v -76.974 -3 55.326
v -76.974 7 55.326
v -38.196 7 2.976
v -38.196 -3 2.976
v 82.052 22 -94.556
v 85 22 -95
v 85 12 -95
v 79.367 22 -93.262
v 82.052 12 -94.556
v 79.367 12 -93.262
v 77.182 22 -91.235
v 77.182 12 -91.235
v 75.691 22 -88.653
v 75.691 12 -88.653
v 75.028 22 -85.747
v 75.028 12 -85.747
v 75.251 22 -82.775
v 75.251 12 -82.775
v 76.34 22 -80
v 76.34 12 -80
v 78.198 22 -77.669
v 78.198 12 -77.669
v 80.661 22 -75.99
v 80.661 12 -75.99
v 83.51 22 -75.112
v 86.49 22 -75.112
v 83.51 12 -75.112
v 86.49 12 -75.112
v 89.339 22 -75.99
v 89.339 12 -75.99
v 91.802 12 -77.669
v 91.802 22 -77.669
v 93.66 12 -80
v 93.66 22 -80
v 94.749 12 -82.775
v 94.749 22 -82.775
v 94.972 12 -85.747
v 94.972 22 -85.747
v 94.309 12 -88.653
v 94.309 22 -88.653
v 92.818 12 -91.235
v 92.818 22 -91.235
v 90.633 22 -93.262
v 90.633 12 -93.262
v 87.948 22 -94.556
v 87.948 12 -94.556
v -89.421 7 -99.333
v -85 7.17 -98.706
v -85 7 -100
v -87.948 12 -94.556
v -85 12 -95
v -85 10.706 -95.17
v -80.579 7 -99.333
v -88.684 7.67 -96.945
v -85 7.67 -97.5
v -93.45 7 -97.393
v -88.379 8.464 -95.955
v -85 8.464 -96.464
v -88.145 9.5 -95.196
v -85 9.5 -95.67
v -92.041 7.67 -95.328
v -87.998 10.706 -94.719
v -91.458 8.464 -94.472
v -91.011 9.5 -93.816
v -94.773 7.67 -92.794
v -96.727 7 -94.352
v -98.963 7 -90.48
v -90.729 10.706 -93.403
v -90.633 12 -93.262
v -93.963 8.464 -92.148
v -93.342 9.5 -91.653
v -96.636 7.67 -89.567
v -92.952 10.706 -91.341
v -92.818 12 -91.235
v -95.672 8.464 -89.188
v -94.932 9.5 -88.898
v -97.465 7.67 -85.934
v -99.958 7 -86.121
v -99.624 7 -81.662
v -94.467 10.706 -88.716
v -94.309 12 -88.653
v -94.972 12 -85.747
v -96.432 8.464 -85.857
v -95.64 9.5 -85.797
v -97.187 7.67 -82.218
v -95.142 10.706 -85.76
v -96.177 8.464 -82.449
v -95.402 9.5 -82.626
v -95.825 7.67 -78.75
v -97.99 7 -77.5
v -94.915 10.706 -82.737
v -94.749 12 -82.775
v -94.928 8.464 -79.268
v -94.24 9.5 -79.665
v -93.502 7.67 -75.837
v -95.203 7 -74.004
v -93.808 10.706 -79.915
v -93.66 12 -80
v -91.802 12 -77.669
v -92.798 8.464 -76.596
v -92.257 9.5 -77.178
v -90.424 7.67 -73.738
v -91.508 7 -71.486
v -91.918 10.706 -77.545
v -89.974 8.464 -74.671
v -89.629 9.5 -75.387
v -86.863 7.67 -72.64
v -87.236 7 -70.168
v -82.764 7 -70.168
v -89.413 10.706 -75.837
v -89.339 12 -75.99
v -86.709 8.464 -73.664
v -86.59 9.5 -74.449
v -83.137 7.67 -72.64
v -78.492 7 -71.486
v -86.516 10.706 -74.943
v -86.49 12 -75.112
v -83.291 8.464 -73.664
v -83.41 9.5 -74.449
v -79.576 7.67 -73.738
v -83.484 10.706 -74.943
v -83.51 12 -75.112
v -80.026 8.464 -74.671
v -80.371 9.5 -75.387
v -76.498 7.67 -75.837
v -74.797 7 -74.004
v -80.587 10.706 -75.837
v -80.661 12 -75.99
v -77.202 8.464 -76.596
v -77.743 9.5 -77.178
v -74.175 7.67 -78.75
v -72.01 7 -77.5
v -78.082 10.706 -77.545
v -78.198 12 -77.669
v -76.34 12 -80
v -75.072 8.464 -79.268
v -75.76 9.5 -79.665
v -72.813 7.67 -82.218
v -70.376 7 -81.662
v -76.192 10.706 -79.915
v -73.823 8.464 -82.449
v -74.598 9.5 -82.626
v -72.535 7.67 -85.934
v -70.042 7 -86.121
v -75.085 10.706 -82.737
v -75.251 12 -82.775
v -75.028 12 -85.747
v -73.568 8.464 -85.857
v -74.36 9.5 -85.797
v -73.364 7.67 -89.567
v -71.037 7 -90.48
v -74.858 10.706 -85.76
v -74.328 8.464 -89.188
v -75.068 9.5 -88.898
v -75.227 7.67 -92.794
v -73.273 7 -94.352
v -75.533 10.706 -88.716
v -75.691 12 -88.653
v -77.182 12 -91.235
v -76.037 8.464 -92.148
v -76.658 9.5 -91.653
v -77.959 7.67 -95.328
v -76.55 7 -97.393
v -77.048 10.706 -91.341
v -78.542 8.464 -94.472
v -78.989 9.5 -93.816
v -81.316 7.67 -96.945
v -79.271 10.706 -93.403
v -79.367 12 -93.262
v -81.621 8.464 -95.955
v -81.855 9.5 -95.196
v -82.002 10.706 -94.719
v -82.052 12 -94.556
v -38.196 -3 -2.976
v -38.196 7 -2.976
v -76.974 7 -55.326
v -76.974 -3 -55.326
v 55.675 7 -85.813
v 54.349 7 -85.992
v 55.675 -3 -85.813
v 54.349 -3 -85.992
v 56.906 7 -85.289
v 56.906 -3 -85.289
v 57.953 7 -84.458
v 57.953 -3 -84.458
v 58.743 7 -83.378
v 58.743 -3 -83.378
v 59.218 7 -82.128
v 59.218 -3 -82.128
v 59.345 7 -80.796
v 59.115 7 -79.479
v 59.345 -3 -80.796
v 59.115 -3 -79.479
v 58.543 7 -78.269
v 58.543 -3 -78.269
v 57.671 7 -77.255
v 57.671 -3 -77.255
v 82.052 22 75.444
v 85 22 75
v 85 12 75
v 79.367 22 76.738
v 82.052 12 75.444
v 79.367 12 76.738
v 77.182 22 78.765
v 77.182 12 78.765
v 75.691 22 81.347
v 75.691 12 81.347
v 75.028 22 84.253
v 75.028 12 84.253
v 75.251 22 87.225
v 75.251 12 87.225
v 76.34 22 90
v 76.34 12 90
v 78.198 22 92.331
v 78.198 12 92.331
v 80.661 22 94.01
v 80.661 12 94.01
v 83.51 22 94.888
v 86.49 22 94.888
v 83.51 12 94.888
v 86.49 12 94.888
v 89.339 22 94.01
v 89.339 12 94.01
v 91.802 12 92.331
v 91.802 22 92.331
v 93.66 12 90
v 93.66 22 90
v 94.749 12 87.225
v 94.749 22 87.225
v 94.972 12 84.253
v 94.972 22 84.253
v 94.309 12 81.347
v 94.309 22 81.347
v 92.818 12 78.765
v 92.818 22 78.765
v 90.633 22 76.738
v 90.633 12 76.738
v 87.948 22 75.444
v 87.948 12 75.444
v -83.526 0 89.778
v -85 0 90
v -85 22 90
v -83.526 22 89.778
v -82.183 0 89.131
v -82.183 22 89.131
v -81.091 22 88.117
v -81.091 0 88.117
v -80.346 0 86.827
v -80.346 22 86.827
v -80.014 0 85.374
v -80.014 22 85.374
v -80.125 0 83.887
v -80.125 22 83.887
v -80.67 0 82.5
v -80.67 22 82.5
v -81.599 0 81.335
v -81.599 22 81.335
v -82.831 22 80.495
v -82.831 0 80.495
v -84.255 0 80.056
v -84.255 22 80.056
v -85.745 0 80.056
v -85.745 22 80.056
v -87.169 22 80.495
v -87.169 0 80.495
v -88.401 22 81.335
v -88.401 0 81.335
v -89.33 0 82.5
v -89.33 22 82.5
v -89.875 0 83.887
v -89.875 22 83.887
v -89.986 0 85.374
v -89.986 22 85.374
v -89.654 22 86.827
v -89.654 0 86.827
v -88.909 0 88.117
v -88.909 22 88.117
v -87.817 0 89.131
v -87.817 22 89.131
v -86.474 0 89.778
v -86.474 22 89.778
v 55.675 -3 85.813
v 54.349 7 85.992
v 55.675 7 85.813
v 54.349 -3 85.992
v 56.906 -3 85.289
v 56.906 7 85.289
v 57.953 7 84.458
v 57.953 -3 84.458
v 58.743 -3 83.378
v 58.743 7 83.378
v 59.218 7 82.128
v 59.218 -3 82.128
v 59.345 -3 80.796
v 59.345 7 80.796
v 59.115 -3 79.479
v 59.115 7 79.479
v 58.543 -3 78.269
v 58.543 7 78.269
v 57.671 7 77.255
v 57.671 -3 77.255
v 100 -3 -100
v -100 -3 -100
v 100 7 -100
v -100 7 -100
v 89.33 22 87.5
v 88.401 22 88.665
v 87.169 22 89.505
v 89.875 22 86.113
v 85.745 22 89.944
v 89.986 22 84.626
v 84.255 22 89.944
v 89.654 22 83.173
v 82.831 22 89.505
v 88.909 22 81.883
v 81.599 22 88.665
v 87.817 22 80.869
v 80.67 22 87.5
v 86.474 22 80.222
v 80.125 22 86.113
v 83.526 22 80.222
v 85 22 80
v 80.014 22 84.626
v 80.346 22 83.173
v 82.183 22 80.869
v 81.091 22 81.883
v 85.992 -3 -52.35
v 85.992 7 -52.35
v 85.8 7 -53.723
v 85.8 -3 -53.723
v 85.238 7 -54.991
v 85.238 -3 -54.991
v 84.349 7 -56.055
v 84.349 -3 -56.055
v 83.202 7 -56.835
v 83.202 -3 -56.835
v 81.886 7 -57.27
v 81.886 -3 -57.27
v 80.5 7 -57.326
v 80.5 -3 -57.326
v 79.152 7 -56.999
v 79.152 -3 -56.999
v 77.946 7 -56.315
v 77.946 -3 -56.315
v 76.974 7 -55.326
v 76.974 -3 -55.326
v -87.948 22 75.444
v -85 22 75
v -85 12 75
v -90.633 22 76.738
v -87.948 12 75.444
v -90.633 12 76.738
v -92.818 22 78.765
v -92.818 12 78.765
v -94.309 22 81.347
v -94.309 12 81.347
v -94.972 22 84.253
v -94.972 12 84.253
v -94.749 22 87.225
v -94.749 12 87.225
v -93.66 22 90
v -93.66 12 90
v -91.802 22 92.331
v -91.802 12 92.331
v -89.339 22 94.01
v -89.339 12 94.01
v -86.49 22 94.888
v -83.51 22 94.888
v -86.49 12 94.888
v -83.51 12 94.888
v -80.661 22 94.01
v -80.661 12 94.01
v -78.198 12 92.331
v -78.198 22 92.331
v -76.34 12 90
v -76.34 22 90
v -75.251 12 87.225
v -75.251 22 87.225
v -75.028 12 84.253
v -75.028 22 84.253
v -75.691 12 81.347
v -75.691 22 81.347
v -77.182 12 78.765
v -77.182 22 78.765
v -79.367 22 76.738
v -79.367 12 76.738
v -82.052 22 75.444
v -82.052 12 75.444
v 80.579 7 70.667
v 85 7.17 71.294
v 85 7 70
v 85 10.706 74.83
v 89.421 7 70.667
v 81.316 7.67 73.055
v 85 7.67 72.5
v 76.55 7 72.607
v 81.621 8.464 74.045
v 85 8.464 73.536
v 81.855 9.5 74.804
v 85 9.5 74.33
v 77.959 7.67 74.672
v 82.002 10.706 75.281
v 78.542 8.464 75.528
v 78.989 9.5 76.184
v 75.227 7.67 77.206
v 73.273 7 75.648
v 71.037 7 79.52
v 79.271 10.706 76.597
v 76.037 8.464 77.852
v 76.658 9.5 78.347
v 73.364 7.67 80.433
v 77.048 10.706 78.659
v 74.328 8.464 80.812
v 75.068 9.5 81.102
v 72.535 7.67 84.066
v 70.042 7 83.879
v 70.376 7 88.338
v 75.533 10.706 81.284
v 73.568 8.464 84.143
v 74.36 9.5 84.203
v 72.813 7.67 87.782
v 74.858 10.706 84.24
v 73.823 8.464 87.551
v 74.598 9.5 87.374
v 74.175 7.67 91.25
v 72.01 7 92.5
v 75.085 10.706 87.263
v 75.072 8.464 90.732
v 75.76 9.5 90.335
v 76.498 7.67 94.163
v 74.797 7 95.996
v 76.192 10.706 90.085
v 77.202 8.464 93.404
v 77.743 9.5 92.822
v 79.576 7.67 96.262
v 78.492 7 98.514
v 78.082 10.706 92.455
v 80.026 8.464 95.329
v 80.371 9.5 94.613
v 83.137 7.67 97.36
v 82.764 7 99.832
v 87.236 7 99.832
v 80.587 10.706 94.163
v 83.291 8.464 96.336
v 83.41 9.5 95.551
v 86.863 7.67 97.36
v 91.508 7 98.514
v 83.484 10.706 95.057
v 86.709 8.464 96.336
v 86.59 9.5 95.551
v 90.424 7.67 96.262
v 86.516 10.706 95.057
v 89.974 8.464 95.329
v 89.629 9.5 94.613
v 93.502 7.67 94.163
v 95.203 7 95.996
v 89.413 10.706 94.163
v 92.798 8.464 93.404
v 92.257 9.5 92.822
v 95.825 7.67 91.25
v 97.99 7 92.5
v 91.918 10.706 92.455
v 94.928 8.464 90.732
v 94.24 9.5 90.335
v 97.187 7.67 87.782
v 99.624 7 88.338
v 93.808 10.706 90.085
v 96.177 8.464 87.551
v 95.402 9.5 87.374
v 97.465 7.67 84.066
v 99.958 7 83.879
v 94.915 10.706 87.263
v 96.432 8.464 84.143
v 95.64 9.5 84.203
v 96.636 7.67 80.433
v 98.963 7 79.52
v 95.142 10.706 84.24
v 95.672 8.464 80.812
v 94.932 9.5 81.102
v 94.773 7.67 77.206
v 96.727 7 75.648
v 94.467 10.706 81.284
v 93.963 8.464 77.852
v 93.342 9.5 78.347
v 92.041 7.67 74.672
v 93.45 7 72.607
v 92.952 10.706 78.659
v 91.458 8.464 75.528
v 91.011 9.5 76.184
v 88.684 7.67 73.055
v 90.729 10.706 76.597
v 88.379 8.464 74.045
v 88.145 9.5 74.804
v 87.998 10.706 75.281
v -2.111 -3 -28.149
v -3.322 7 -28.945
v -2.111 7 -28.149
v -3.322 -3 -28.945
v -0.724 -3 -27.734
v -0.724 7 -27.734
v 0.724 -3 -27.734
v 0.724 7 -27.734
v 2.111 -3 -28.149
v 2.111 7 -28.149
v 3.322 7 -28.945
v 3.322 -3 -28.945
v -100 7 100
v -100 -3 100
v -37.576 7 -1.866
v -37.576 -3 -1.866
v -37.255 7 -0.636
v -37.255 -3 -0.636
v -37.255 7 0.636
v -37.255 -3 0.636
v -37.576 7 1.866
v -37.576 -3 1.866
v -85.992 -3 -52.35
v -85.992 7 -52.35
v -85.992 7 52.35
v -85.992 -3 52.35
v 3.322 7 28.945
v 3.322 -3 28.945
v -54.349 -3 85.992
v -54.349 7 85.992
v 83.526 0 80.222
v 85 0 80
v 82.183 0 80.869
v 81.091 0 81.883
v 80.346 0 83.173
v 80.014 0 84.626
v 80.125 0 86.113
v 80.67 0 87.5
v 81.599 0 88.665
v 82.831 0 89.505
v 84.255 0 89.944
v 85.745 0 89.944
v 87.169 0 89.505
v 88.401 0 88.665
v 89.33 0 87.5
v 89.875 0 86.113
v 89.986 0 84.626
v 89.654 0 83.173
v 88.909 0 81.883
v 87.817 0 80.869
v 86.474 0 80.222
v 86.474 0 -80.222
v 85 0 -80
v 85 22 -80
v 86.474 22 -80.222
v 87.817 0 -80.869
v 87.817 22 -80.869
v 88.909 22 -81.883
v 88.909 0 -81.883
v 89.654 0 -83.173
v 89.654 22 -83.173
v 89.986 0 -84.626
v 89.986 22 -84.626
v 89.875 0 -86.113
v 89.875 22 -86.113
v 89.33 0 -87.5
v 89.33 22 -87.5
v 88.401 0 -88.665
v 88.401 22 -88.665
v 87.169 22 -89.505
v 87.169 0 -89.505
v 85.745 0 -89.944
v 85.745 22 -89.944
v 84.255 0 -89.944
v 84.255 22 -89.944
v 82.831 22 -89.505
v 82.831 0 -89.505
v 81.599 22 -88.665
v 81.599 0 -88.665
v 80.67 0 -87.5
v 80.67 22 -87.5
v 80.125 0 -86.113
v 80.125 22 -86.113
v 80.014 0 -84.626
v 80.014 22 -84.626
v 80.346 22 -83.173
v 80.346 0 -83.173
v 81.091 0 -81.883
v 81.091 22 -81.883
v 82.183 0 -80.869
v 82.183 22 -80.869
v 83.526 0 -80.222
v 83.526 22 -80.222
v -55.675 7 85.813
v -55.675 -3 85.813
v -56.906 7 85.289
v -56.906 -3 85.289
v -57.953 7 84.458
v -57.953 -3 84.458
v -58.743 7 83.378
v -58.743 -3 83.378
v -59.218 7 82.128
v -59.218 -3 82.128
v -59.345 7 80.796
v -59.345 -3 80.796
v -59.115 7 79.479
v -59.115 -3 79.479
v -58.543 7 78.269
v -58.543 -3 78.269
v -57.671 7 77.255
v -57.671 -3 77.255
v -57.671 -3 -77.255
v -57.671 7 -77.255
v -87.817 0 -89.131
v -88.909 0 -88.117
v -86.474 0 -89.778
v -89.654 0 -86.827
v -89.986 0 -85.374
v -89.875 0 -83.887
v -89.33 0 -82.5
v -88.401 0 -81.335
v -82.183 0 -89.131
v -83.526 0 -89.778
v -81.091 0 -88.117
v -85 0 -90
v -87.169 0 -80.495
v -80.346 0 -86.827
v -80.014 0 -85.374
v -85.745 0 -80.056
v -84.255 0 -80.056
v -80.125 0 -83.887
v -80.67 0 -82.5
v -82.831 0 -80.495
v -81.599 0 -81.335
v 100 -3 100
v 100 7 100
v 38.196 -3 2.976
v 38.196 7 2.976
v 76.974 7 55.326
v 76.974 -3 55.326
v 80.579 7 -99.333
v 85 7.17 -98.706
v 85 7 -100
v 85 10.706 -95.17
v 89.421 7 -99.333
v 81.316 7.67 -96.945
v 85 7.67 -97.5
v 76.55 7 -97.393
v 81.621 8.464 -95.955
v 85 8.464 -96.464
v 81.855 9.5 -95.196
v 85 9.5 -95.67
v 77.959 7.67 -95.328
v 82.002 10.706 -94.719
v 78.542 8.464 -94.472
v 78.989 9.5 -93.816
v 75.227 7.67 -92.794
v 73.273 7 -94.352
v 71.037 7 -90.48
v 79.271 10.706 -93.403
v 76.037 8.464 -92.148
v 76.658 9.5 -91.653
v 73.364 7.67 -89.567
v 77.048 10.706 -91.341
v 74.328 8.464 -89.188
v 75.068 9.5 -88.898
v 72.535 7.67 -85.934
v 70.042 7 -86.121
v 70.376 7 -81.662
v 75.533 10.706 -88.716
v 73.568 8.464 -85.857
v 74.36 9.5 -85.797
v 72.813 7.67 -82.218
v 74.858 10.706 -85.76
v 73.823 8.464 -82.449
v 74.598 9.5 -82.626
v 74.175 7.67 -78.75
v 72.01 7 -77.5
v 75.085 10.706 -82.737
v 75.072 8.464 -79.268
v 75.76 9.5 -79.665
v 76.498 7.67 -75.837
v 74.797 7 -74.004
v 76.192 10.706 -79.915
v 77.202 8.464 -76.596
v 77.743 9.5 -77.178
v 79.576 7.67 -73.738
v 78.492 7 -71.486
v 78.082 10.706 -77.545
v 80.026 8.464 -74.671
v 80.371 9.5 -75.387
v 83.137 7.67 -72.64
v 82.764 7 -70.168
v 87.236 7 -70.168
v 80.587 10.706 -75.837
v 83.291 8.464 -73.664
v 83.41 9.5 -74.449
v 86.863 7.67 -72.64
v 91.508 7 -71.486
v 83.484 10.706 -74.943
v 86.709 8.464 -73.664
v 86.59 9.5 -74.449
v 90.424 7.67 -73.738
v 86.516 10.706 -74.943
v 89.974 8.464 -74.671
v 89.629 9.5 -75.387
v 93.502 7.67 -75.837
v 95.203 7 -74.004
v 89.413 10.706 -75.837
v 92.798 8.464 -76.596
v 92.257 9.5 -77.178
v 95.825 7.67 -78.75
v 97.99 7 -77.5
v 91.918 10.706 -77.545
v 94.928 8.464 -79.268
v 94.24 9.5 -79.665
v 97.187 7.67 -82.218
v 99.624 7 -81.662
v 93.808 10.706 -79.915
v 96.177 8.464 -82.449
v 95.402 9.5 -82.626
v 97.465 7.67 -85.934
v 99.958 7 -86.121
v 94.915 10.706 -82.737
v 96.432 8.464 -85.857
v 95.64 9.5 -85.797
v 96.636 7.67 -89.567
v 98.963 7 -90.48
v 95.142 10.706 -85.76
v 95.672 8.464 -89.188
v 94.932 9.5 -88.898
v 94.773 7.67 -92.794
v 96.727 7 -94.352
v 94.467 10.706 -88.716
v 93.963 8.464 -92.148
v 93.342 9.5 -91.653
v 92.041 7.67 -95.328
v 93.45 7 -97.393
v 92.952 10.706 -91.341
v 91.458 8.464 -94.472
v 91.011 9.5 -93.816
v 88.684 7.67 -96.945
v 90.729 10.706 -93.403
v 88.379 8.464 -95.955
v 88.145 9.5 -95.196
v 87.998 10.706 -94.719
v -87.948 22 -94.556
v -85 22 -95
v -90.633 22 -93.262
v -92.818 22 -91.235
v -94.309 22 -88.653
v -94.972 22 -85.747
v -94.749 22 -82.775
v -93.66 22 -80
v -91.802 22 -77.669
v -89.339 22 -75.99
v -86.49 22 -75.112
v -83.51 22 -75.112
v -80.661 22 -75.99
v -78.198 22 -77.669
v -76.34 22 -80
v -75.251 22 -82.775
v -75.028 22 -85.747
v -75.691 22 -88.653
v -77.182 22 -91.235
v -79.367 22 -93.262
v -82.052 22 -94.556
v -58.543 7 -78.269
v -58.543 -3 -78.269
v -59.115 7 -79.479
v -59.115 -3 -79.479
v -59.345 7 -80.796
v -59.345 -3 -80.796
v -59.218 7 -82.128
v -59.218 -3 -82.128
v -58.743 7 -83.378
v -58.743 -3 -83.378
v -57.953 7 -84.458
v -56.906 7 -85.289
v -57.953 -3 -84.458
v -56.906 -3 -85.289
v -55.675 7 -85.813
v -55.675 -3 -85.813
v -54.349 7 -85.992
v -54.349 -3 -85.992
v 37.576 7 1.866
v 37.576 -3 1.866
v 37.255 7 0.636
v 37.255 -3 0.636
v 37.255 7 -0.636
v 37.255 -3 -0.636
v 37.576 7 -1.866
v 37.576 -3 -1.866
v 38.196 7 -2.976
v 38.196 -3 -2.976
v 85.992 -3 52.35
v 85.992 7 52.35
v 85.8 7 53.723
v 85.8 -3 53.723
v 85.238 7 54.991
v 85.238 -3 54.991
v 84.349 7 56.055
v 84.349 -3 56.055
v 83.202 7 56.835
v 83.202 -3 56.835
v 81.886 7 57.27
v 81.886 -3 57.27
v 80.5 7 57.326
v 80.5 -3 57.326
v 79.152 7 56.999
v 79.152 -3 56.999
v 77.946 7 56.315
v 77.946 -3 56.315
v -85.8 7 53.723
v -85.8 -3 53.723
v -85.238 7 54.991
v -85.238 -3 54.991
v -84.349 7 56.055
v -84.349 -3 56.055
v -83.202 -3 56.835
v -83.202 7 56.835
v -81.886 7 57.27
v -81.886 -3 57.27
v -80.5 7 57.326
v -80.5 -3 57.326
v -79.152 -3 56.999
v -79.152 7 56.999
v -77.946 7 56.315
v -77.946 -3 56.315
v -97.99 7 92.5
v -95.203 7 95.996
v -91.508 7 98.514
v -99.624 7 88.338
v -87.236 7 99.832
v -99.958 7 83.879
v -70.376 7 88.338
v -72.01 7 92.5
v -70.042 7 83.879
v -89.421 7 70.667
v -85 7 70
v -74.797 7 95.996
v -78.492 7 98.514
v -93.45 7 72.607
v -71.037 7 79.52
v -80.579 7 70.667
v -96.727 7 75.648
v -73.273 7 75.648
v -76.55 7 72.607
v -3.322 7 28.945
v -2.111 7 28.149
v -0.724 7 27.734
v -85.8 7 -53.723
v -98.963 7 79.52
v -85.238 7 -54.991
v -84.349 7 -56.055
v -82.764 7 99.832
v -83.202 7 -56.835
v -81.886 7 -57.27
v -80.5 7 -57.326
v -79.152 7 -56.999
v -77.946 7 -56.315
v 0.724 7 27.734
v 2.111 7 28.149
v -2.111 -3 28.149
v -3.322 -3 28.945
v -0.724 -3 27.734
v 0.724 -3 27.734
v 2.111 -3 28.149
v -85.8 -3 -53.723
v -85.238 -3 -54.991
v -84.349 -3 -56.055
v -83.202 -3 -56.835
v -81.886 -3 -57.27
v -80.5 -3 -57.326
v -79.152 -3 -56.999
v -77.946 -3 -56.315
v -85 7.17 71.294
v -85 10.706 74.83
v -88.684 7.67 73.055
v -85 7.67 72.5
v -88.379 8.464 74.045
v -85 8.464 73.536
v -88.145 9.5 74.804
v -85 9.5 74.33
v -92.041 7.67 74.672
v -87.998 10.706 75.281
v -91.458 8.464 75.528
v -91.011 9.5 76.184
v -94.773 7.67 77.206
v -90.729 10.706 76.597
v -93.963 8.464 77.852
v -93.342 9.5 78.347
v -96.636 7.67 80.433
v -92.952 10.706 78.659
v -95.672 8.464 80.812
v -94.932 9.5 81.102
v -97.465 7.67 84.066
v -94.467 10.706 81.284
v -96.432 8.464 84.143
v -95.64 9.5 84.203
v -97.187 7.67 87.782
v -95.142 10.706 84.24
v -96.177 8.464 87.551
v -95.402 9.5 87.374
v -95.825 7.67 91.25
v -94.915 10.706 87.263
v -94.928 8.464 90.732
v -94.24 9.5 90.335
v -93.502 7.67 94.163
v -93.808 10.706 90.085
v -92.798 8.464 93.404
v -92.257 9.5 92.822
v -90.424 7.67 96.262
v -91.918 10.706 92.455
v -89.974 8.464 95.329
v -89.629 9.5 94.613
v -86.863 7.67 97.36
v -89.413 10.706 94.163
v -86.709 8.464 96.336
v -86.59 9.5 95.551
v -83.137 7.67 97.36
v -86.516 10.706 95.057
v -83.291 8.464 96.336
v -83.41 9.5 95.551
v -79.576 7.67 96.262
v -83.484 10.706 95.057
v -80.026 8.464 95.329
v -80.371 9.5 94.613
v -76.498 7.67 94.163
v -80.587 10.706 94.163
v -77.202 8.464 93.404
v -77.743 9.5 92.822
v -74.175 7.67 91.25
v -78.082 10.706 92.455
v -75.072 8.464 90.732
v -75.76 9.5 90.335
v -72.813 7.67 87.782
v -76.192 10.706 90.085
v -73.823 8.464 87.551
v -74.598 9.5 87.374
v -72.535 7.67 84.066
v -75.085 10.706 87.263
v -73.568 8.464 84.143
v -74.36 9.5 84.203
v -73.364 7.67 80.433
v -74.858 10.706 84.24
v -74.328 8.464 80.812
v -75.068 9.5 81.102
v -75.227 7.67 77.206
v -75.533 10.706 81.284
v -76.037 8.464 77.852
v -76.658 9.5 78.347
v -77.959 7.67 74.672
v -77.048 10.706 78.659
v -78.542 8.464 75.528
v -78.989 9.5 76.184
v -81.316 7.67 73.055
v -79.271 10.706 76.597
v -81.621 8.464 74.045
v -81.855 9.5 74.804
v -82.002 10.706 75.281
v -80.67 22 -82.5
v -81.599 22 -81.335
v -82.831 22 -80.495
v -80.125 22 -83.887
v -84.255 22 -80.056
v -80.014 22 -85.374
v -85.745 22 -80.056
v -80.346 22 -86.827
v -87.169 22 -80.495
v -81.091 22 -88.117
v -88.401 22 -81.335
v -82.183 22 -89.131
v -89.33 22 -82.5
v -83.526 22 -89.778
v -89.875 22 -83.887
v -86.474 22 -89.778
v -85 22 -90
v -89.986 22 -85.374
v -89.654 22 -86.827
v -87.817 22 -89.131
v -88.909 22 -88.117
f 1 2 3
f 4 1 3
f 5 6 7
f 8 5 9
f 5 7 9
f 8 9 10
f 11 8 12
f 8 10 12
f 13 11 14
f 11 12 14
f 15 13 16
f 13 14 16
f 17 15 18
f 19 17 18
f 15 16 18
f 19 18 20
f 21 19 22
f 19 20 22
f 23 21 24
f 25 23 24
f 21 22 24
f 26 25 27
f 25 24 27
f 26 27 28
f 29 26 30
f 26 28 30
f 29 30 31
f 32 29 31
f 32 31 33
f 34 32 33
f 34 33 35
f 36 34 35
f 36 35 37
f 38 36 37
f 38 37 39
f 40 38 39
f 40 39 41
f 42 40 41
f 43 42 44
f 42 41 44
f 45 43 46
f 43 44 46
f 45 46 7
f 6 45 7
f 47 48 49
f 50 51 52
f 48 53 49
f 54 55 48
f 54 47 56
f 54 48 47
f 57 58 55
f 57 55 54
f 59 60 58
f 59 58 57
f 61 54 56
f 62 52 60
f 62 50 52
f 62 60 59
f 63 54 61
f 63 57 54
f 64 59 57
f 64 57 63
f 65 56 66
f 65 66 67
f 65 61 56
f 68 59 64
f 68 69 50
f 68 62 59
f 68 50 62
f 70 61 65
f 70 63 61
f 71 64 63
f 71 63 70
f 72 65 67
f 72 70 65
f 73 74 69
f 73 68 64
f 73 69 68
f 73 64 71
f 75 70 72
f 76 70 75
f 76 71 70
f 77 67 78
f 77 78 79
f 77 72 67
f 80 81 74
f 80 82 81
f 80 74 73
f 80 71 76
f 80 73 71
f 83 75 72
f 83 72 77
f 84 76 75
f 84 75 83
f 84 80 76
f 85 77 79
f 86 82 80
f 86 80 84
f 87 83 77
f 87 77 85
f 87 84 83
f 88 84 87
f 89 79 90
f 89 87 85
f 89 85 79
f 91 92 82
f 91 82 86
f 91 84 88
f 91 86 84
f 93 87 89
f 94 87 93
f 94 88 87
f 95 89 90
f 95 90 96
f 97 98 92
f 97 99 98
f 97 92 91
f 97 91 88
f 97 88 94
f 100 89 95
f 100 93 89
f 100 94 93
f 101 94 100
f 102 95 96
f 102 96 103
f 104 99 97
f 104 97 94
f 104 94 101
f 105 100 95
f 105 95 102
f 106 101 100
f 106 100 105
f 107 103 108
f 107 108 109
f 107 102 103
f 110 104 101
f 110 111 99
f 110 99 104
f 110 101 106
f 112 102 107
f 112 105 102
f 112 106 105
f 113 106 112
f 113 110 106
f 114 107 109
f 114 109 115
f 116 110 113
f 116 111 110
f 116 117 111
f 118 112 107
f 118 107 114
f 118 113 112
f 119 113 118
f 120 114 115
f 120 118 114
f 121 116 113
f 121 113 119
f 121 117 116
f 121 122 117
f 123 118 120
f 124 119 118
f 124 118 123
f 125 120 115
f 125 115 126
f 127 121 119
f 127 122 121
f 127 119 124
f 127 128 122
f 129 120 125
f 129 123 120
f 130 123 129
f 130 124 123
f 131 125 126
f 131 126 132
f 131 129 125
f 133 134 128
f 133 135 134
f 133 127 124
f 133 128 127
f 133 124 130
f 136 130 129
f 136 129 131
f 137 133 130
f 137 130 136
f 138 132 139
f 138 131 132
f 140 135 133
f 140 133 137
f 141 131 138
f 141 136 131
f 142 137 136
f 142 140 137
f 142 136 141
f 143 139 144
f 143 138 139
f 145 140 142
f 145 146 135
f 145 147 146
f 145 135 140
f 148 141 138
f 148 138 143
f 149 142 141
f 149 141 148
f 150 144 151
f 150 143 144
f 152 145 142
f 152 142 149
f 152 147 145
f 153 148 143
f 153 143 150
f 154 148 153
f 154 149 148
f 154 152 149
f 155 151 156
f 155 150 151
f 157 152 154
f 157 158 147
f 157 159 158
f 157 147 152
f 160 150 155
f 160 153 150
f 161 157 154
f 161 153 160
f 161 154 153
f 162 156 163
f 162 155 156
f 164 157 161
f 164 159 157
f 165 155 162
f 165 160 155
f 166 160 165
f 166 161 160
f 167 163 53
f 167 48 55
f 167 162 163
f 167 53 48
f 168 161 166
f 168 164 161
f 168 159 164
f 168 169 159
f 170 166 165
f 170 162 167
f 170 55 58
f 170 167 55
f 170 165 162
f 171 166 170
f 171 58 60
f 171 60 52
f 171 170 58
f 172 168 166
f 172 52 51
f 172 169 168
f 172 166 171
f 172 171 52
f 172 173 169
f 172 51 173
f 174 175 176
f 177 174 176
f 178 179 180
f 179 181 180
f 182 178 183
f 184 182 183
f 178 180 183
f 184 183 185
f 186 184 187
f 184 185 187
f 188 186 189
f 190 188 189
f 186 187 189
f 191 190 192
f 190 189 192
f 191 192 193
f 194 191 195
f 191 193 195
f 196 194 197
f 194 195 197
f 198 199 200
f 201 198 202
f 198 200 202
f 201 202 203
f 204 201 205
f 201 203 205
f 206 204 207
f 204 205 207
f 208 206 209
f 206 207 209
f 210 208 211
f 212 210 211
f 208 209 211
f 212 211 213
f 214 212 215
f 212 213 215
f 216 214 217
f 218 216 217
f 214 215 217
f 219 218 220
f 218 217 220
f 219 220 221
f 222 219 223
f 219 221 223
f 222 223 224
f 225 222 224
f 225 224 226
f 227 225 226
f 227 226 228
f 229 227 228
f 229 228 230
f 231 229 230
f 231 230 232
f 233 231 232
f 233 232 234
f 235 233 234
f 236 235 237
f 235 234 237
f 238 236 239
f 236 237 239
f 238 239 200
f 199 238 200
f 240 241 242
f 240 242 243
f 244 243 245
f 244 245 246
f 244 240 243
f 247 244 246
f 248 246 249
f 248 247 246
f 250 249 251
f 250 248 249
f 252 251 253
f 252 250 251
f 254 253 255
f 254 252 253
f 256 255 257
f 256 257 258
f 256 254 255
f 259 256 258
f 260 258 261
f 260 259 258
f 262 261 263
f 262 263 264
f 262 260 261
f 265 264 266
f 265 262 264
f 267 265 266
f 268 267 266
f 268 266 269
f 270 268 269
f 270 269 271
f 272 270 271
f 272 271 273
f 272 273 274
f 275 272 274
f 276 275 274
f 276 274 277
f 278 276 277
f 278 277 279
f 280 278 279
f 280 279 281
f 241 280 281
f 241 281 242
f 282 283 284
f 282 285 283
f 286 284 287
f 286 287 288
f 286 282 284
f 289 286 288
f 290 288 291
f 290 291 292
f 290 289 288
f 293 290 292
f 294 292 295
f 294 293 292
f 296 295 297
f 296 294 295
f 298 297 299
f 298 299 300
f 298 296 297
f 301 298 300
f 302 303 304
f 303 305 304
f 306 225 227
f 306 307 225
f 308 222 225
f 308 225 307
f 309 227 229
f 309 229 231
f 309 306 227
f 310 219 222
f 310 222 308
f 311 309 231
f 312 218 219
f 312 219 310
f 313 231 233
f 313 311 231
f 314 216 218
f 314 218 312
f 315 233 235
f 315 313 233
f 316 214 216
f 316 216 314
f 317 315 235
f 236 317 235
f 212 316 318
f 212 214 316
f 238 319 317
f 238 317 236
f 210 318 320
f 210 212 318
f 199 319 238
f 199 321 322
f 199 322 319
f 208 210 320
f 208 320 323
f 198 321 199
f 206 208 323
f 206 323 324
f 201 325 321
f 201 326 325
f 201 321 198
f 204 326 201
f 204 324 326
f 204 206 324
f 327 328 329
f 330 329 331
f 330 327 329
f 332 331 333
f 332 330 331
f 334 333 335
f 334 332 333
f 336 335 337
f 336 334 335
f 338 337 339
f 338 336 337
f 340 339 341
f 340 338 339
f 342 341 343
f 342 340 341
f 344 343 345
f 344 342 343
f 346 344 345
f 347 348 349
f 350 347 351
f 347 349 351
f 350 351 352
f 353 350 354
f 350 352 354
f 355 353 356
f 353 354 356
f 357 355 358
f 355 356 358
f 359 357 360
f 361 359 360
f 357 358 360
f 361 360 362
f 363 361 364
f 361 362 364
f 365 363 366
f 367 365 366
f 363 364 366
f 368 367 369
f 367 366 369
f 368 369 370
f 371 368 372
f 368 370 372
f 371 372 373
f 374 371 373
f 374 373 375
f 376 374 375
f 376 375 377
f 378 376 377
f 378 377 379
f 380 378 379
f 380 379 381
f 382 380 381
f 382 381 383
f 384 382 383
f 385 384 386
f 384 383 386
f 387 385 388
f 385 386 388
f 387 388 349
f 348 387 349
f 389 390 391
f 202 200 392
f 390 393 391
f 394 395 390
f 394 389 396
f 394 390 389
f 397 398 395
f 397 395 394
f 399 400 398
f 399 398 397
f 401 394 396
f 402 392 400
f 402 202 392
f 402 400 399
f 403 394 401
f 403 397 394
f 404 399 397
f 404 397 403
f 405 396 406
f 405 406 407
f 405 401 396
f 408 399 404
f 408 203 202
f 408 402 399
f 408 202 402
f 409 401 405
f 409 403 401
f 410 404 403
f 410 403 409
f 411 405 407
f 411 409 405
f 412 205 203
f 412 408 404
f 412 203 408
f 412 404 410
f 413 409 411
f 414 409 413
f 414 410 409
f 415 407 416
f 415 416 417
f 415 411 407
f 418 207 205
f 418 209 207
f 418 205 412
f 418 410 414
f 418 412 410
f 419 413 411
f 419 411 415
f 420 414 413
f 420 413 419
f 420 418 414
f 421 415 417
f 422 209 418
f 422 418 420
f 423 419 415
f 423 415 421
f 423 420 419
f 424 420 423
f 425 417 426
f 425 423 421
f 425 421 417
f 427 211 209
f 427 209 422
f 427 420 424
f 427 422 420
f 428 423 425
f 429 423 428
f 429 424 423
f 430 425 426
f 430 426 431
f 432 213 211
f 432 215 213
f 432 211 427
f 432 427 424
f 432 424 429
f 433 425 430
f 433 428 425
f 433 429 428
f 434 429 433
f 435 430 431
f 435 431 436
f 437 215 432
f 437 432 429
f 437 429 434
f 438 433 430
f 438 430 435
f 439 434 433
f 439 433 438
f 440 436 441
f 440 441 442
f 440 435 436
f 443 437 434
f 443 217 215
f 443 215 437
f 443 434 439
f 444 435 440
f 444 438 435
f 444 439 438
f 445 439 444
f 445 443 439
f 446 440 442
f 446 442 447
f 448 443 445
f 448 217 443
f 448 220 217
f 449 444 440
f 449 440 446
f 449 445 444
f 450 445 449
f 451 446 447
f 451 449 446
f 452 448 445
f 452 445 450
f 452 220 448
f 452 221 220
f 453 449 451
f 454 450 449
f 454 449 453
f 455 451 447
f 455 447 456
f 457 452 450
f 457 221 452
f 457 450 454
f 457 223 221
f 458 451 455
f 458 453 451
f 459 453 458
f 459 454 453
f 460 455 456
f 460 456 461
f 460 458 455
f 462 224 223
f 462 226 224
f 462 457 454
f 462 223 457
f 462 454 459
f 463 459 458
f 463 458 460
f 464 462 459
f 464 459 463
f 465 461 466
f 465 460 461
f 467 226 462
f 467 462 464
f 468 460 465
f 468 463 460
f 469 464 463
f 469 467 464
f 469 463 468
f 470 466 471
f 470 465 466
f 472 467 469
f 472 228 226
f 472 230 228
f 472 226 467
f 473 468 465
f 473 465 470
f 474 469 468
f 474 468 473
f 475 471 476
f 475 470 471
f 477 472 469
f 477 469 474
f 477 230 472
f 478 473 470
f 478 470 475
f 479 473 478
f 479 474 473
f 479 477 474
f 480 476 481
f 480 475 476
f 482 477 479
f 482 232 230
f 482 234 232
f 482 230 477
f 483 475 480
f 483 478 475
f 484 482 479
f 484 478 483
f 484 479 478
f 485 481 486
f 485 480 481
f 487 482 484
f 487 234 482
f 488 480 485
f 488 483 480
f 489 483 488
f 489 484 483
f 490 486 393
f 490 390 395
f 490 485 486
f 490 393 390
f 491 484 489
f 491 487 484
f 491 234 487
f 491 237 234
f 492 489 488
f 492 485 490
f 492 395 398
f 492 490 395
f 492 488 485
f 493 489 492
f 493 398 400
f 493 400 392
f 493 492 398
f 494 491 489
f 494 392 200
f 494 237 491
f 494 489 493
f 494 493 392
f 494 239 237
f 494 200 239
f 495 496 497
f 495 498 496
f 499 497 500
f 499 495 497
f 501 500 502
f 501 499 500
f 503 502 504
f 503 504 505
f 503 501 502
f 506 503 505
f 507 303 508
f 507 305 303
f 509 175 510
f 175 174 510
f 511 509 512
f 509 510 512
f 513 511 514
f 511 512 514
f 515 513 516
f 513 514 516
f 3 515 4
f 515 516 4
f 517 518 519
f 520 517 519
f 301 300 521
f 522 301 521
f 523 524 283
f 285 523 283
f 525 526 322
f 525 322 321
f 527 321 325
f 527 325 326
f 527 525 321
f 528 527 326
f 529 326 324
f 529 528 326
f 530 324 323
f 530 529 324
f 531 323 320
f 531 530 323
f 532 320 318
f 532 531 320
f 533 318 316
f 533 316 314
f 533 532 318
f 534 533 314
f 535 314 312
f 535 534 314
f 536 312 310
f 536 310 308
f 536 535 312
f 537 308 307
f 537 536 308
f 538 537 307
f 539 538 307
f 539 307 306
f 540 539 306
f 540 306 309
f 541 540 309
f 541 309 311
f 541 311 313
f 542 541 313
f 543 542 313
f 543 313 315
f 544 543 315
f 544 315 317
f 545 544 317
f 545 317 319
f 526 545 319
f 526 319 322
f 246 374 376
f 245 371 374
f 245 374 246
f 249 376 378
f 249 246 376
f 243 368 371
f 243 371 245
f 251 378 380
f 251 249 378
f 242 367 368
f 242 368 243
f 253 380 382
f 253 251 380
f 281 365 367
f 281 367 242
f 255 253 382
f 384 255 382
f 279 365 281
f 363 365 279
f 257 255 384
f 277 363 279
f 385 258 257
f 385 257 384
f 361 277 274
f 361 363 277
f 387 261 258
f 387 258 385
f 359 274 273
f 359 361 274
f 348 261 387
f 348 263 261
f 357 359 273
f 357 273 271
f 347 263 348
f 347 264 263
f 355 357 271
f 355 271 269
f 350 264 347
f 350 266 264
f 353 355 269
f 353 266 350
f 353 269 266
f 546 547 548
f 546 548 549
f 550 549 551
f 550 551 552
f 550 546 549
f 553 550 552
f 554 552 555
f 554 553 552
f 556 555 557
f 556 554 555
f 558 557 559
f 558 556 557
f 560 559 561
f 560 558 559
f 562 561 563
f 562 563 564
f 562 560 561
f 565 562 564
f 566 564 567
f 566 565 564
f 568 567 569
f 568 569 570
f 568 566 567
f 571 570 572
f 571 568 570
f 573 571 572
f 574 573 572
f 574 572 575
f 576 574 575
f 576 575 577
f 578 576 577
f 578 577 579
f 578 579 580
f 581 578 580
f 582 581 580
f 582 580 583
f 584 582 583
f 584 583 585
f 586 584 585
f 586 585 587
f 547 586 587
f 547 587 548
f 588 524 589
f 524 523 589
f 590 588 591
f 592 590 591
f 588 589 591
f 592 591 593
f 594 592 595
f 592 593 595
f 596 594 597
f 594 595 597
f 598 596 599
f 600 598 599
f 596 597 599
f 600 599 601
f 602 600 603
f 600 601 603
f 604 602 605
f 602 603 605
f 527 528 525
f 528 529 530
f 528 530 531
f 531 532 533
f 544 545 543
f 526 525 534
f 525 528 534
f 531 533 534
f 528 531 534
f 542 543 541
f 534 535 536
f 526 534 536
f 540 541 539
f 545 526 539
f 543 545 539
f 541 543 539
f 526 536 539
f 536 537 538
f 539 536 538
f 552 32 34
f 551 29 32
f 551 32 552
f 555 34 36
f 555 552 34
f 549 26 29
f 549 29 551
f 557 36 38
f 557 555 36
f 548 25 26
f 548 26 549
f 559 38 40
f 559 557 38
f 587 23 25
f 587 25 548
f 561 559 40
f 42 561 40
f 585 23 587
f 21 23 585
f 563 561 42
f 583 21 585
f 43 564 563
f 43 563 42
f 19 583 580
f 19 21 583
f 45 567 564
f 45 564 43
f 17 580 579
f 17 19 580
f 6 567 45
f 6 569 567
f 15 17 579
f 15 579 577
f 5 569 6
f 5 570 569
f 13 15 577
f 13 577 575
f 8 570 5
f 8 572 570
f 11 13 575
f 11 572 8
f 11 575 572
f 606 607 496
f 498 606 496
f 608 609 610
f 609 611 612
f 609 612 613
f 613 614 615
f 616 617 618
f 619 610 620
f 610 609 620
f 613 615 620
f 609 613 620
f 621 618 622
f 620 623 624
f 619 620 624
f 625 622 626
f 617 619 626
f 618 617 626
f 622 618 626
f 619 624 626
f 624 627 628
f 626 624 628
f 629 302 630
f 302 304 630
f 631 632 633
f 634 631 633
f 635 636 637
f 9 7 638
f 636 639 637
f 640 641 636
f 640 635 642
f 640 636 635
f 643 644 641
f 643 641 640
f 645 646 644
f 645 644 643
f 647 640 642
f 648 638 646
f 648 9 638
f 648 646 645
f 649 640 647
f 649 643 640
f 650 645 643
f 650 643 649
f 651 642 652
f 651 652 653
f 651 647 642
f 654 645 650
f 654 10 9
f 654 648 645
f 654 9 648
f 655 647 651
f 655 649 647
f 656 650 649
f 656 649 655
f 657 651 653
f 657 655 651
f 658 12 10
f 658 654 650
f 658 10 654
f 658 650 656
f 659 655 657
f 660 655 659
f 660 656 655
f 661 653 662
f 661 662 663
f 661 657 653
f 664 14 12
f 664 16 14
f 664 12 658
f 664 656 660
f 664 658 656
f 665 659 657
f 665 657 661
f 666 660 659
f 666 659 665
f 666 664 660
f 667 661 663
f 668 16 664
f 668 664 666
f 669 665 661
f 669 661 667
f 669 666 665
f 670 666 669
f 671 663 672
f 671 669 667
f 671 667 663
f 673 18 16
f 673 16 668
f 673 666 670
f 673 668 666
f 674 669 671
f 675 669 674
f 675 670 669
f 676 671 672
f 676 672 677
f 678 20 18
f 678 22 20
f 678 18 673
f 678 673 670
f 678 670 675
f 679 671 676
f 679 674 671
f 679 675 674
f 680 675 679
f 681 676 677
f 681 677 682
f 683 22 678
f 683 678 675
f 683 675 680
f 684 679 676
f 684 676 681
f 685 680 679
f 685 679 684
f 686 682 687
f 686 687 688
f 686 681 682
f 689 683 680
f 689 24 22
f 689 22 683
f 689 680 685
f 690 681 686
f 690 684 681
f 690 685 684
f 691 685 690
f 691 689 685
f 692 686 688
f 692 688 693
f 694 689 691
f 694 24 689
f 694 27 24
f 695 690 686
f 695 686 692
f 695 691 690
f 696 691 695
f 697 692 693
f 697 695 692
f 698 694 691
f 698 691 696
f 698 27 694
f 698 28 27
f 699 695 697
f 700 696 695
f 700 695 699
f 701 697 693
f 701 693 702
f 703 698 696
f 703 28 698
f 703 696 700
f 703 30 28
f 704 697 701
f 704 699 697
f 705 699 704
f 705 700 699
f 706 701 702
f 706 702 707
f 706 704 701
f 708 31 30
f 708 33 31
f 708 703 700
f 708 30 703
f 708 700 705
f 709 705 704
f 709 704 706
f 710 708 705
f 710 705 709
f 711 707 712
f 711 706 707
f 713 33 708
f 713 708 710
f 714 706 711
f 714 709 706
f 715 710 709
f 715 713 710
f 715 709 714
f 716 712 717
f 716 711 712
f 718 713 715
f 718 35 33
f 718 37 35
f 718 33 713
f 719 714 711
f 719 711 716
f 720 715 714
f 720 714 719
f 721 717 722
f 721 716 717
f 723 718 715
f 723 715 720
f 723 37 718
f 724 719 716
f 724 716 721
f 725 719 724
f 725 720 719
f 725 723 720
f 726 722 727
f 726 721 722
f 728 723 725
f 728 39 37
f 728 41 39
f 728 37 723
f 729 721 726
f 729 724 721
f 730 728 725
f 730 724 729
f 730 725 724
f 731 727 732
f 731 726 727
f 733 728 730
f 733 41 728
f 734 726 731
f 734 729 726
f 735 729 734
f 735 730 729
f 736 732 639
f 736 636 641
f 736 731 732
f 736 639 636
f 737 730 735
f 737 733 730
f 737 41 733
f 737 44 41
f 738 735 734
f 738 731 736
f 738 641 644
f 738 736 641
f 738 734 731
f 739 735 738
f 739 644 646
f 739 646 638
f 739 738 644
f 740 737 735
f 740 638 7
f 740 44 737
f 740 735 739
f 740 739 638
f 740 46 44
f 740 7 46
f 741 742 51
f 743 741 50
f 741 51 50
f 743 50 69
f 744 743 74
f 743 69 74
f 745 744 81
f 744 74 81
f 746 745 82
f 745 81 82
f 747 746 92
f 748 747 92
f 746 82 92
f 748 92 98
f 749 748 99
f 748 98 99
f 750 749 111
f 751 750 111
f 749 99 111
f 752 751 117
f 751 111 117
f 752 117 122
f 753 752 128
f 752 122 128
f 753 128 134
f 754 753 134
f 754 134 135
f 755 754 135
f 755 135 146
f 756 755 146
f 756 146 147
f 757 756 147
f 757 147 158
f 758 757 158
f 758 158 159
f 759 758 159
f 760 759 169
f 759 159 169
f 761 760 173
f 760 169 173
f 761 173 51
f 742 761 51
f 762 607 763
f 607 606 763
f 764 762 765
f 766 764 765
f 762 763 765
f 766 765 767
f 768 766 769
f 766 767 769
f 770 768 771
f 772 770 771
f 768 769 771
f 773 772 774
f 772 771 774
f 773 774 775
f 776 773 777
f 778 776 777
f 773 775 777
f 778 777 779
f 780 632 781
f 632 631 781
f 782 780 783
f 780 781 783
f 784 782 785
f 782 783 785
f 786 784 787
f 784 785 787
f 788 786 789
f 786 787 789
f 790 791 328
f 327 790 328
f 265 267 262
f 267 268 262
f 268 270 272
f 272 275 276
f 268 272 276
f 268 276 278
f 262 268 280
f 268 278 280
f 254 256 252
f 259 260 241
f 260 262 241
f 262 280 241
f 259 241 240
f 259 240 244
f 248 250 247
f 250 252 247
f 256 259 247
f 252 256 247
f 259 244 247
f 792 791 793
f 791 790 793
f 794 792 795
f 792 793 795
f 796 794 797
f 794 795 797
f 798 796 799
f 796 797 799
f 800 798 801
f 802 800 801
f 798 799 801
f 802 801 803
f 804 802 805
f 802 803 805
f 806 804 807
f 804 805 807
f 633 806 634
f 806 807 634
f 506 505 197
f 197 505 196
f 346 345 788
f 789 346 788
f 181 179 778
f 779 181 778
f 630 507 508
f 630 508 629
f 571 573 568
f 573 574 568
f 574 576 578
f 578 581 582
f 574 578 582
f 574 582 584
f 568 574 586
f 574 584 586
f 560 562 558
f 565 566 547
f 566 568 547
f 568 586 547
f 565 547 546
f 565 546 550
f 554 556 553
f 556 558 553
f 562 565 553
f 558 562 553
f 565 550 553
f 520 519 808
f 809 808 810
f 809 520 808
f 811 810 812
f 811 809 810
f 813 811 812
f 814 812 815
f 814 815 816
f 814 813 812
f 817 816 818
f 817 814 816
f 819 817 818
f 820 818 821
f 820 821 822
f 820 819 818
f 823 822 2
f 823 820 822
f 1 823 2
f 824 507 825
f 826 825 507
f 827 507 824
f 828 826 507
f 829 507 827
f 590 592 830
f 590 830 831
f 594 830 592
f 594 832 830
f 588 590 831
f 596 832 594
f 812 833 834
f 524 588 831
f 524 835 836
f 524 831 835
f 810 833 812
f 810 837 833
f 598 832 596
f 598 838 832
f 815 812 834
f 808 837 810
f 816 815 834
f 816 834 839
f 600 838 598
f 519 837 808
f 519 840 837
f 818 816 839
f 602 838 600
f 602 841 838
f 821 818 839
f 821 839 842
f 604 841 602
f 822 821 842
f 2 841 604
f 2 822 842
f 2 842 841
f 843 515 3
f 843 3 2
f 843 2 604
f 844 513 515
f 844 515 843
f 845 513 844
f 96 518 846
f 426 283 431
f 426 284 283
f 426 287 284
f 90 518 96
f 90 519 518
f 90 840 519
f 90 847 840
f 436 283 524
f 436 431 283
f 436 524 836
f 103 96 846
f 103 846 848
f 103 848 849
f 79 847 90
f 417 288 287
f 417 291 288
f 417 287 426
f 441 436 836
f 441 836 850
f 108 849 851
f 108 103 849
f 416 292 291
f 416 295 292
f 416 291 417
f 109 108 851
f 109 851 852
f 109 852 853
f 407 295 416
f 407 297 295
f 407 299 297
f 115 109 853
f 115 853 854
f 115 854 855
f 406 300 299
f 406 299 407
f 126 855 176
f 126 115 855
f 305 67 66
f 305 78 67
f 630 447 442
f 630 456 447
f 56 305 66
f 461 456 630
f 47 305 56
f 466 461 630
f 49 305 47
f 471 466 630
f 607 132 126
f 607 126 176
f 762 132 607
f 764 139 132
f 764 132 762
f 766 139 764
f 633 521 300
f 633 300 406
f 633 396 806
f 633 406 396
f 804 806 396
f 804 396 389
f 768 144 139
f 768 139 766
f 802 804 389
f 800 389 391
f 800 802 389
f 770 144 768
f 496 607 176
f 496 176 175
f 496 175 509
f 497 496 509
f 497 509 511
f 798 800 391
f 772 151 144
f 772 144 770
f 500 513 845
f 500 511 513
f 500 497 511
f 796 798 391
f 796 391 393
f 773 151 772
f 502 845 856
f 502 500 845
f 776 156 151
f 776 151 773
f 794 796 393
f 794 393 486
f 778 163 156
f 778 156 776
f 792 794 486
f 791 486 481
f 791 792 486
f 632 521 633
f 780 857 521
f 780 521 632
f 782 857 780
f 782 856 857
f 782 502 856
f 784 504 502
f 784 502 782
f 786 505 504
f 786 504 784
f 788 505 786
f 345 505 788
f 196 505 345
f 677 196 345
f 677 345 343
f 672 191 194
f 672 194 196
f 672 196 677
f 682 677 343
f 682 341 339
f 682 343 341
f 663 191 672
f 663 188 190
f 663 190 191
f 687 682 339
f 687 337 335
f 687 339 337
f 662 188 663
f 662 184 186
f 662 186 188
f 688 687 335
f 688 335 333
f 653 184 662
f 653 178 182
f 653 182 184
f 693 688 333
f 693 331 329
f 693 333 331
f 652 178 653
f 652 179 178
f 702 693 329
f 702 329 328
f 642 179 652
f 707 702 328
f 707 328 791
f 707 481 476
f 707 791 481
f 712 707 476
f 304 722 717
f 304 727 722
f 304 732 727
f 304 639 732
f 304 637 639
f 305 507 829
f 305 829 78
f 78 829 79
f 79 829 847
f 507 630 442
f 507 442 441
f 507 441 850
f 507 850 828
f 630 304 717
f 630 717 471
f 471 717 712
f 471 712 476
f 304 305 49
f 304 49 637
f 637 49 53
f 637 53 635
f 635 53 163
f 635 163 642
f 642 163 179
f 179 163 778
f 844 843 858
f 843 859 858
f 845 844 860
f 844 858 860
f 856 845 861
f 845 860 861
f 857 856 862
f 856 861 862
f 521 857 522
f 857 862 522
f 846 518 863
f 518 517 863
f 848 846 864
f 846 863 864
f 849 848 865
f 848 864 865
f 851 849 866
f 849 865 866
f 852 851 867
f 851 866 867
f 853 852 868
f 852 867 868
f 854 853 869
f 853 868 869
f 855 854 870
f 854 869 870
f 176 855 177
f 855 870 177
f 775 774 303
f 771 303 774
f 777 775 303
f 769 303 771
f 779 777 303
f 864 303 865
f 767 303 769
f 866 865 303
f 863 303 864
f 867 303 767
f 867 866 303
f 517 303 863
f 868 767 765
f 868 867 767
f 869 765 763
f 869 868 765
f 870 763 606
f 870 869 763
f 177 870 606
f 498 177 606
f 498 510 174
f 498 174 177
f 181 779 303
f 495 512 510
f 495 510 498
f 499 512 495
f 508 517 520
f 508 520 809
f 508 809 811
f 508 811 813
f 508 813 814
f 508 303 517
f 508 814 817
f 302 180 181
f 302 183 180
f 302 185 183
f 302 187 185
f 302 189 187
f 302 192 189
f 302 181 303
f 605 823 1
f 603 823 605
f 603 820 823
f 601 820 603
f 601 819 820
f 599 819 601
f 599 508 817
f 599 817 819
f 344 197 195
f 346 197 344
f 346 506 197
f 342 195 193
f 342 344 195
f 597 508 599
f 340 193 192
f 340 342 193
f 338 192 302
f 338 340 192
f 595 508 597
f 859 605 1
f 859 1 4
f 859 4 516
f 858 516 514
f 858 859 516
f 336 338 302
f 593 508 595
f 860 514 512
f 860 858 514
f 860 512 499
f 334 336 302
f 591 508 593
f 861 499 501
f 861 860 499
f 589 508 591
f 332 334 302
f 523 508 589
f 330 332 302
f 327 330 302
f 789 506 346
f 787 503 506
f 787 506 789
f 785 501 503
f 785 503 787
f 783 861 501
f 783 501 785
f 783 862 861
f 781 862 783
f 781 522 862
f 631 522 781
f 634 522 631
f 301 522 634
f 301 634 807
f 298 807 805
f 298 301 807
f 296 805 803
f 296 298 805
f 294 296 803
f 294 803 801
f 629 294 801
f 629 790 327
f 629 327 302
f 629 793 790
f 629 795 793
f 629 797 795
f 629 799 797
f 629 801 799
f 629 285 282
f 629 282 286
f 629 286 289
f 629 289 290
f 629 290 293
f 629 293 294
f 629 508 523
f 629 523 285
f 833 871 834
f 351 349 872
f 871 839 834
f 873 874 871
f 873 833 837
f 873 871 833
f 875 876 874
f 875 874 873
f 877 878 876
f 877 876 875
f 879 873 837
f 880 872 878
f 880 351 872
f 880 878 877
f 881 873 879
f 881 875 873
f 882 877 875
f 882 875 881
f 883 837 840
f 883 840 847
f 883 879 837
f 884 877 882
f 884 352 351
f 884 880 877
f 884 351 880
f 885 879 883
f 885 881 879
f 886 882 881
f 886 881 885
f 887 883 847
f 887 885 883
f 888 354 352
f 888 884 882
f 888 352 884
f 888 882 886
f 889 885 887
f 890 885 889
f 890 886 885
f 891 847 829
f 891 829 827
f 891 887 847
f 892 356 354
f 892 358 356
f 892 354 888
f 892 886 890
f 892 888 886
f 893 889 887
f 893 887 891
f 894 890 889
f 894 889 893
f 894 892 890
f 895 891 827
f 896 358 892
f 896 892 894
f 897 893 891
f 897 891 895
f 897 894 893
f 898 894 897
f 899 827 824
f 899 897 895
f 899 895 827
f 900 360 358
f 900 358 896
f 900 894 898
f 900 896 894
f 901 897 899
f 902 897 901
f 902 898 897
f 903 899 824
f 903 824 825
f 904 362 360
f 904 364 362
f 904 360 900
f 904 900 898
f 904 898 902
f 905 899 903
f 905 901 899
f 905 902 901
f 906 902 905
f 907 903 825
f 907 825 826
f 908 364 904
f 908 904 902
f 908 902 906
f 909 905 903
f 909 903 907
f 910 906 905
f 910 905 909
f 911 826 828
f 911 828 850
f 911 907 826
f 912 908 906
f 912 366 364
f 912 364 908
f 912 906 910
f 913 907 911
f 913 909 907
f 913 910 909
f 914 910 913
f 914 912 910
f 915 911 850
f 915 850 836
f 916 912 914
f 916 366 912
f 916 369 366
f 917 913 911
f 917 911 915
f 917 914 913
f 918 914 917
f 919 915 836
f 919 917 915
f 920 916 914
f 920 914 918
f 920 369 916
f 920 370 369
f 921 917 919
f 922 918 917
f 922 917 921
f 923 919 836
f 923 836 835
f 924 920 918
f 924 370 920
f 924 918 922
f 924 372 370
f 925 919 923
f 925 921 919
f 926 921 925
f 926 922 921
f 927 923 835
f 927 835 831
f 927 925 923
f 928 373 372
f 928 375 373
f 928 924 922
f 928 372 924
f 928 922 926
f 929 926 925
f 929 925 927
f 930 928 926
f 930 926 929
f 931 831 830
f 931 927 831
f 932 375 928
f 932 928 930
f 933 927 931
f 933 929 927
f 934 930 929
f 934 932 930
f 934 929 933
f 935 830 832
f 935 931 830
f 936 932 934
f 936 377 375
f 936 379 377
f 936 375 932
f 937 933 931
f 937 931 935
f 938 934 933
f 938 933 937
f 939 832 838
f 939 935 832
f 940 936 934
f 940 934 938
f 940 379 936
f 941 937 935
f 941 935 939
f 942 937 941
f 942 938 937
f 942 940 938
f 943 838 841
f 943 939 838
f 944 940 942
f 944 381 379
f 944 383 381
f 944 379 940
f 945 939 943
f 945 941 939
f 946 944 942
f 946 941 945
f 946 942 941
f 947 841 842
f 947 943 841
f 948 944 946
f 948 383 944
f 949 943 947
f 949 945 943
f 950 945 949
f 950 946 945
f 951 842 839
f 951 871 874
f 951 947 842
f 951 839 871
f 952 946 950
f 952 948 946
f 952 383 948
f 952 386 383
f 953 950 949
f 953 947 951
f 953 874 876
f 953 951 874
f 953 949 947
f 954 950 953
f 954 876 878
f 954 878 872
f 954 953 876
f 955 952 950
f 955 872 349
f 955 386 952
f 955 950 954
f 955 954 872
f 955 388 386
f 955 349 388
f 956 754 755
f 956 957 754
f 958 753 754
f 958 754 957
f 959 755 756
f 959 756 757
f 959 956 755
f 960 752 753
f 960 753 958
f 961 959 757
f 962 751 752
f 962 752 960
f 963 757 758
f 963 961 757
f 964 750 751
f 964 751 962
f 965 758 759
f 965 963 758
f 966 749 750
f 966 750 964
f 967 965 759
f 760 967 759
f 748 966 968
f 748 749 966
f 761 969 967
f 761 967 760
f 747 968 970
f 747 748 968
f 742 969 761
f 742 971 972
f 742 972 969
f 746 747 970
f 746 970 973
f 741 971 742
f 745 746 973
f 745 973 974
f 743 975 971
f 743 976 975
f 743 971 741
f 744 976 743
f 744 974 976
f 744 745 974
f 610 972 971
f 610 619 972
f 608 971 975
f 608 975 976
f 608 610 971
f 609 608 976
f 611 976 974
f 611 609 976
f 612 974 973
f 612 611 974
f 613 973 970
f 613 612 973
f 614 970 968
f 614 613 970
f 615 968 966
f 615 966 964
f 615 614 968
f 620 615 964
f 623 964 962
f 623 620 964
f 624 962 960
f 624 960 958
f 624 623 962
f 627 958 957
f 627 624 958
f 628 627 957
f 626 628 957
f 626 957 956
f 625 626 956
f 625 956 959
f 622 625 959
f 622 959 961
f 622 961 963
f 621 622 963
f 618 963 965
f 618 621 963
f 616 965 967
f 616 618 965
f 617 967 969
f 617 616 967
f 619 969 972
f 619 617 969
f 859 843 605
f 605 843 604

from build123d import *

# Parameters (mm, degrees)
SKETCH_1_W          = 200
SKETCH_1_H          = 200
SKETCH_1_R          = 5
EXTRUDE_1_DEPTH     = 7
SKETCH_2_R          = 10
SKETCH_2_R_2        = 5
EXTRUDE_2_DEPTH     = 15
SKETCH_3_W          = 200
SKETCH_3_H          = 200
EXTRUDE_3_DEPTH     = 3
CUT_EXTRUDE_2_DEPTH = 143.214626533
FILLET_2_R          = 5


with BuildPart() as part:
    # 草圖1 → 填料-伸長1 (new body)
    with BuildSketch(Plane(origin=(0, 0, 0), x_dir=(1, 0, 0), z_dir=(0, 1, 0))):
        Rectangle(SKETCH_1_W, SKETCH_1_H)
        with Locations(Location((85, 85, 0), (0, 0, 270))):
            Circle(SKETCH_1_R, mode=Mode.SUBTRACT)
        with Locations(Location((-85, 85, 0), (0, 0, 90))):
            Circle(SKETCH_1_R, mode=Mode.SUBTRACT)
        with Locations(Location((85, -85, 0), (0, 0, 90))):
            Circle(SKETCH_1_R, mode=Mode.SUBTRACT)
        with Locations(Location((-85, -85, 0), (0, 0, 270))):
            Circle(SKETCH_1_R, mode=Mode.SUBTRACT)
    extrude(amount=EXTRUDE_1_DEPTH)

    # 草圖2 → 填料-伸長2 (add)
    # profile 1 of 4: a face of its own
    with BuildSketch(Plane(origin=(0, 7, 0), x_dir=(1, 0, 0), z_dir=(0, 1, 0))):
        with Locations(Location((-85, 85, 0), (0, 0, 90))):
            Circle(SKETCH_2_R)
        with Locations(Location((-85, 85, 0), (0, 0, 90))):
            Circle(SKETCH_2_R_2, mode=Mode.SUBTRACT)
    # profile 2 of 4: a face of its own
    with BuildSketch(Plane(origin=(0, 7, 0), x_dir=(1, 0, 0), z_dir=(0, 1, 0))):
        with Locations(Location((85, 85, 0), (0, 0, 90))):
            Circle(SKETCH_2_R)
        with Locations(Location((85, 85, 0), (0, 0, 270))):
            Circle(SKETCH_2_R_2, mode=Mode.SUBTRACT)
    # profile 3 of 4: a face of its own
    with BuildSketch(Plane(origin=(0, 7, 0), x_dir=(1, 0, 0), z_dir=(0, 1, 0))):
        with Locations(Location((85, -85, 0), (0, 0, 90))):
            Circle(SKETCH_2_R)
        with Locations(Location((85, -85, 0), (0, 0, 90))):
            Circle(SKETCH_2_R_2, mode=Mode.SUBTRACT)
    # profile 4 of 4: a face of its own
    with BuildSketch(Plane(origin=(0, 7, 0), x_dir=(1, 0, 0), z_dir=(0, 1, 0))):
        with Locations(Location((-85, -85, 0), (0, 0, 90))):
            Circle(SKETCH_2_R)
        with Locations(Location((-85, -85, 0), (0, 0, 270))):
            Circle(SKETCH_2_R_2, mode=Mode.SUBTRACT)
    extrude(amount=EXTRUDE_2_DEPTH)

    # 草圖3 → 填料-伸長3 (add)
    with BuildSketch(Plane.XZ):
        Rectangle(SKETCH_3_W, SKETCH_3_H)
    extrude(amount=EXTRUDE_3_DEPTH)

    # 草圖6 → 除料-伸長2 (cut, through all)
    with BuildSketch(Plane(origin=(0, 7, 0), x_dir=(1, 0, 0), z_dir=(0, 1, 0))):
        Polygon((-67.5, 85.991963893), (0, 25.991963893), (67.5, 85.991963893), align=None)
        Polygon((85.991963893, -67.5), (85.991963893, 67.5), (35.991963893, 0), align=None)
        Polygon((-67.5, -85.991963893), (67.5, -85.991963893), (0, -25.991963893), align=None)
        Polygon((-85.991963893, 67.5), (-85.991963893, -67.5), (-35.991963893, 0), align=None)
    extrude(amount=-CUT_EXTRUDE_2_DEPTH, mode=Mode.SUBTRACT)

    # 圓角2
    fillet_2_edges = [part.edges().sort_by_distance(p)[0] for p in [
        (-67.5, 2, -85.991963893),
        (67.5, 2, -85.991963893),
        (0, 2, -25.991963893),
        (-85, 7, -75),
        (85, 7, -75),
        (85, 7, 95),
        (-85, 7, 95),
        (0, 2, 25.991963893),
        (67.5, 2, 85.991963893),
        (-67.5, 2, 85.991963893),
        (35.991963893, 2, 0),
        (85.991963893, 2, -67.5),
        (85.991963893, 2, 67.5),
        (-35.991963893, 2, 0),
        (-85.991963893, 2, 67.5),
        (-85.991963893, 2, -67.5),
    ]]
    fillet(fillet_2_edges, radius=FILLET_2_R - 0.0001)  # a hair under: the kernel refuses the full size


solid = part.part
